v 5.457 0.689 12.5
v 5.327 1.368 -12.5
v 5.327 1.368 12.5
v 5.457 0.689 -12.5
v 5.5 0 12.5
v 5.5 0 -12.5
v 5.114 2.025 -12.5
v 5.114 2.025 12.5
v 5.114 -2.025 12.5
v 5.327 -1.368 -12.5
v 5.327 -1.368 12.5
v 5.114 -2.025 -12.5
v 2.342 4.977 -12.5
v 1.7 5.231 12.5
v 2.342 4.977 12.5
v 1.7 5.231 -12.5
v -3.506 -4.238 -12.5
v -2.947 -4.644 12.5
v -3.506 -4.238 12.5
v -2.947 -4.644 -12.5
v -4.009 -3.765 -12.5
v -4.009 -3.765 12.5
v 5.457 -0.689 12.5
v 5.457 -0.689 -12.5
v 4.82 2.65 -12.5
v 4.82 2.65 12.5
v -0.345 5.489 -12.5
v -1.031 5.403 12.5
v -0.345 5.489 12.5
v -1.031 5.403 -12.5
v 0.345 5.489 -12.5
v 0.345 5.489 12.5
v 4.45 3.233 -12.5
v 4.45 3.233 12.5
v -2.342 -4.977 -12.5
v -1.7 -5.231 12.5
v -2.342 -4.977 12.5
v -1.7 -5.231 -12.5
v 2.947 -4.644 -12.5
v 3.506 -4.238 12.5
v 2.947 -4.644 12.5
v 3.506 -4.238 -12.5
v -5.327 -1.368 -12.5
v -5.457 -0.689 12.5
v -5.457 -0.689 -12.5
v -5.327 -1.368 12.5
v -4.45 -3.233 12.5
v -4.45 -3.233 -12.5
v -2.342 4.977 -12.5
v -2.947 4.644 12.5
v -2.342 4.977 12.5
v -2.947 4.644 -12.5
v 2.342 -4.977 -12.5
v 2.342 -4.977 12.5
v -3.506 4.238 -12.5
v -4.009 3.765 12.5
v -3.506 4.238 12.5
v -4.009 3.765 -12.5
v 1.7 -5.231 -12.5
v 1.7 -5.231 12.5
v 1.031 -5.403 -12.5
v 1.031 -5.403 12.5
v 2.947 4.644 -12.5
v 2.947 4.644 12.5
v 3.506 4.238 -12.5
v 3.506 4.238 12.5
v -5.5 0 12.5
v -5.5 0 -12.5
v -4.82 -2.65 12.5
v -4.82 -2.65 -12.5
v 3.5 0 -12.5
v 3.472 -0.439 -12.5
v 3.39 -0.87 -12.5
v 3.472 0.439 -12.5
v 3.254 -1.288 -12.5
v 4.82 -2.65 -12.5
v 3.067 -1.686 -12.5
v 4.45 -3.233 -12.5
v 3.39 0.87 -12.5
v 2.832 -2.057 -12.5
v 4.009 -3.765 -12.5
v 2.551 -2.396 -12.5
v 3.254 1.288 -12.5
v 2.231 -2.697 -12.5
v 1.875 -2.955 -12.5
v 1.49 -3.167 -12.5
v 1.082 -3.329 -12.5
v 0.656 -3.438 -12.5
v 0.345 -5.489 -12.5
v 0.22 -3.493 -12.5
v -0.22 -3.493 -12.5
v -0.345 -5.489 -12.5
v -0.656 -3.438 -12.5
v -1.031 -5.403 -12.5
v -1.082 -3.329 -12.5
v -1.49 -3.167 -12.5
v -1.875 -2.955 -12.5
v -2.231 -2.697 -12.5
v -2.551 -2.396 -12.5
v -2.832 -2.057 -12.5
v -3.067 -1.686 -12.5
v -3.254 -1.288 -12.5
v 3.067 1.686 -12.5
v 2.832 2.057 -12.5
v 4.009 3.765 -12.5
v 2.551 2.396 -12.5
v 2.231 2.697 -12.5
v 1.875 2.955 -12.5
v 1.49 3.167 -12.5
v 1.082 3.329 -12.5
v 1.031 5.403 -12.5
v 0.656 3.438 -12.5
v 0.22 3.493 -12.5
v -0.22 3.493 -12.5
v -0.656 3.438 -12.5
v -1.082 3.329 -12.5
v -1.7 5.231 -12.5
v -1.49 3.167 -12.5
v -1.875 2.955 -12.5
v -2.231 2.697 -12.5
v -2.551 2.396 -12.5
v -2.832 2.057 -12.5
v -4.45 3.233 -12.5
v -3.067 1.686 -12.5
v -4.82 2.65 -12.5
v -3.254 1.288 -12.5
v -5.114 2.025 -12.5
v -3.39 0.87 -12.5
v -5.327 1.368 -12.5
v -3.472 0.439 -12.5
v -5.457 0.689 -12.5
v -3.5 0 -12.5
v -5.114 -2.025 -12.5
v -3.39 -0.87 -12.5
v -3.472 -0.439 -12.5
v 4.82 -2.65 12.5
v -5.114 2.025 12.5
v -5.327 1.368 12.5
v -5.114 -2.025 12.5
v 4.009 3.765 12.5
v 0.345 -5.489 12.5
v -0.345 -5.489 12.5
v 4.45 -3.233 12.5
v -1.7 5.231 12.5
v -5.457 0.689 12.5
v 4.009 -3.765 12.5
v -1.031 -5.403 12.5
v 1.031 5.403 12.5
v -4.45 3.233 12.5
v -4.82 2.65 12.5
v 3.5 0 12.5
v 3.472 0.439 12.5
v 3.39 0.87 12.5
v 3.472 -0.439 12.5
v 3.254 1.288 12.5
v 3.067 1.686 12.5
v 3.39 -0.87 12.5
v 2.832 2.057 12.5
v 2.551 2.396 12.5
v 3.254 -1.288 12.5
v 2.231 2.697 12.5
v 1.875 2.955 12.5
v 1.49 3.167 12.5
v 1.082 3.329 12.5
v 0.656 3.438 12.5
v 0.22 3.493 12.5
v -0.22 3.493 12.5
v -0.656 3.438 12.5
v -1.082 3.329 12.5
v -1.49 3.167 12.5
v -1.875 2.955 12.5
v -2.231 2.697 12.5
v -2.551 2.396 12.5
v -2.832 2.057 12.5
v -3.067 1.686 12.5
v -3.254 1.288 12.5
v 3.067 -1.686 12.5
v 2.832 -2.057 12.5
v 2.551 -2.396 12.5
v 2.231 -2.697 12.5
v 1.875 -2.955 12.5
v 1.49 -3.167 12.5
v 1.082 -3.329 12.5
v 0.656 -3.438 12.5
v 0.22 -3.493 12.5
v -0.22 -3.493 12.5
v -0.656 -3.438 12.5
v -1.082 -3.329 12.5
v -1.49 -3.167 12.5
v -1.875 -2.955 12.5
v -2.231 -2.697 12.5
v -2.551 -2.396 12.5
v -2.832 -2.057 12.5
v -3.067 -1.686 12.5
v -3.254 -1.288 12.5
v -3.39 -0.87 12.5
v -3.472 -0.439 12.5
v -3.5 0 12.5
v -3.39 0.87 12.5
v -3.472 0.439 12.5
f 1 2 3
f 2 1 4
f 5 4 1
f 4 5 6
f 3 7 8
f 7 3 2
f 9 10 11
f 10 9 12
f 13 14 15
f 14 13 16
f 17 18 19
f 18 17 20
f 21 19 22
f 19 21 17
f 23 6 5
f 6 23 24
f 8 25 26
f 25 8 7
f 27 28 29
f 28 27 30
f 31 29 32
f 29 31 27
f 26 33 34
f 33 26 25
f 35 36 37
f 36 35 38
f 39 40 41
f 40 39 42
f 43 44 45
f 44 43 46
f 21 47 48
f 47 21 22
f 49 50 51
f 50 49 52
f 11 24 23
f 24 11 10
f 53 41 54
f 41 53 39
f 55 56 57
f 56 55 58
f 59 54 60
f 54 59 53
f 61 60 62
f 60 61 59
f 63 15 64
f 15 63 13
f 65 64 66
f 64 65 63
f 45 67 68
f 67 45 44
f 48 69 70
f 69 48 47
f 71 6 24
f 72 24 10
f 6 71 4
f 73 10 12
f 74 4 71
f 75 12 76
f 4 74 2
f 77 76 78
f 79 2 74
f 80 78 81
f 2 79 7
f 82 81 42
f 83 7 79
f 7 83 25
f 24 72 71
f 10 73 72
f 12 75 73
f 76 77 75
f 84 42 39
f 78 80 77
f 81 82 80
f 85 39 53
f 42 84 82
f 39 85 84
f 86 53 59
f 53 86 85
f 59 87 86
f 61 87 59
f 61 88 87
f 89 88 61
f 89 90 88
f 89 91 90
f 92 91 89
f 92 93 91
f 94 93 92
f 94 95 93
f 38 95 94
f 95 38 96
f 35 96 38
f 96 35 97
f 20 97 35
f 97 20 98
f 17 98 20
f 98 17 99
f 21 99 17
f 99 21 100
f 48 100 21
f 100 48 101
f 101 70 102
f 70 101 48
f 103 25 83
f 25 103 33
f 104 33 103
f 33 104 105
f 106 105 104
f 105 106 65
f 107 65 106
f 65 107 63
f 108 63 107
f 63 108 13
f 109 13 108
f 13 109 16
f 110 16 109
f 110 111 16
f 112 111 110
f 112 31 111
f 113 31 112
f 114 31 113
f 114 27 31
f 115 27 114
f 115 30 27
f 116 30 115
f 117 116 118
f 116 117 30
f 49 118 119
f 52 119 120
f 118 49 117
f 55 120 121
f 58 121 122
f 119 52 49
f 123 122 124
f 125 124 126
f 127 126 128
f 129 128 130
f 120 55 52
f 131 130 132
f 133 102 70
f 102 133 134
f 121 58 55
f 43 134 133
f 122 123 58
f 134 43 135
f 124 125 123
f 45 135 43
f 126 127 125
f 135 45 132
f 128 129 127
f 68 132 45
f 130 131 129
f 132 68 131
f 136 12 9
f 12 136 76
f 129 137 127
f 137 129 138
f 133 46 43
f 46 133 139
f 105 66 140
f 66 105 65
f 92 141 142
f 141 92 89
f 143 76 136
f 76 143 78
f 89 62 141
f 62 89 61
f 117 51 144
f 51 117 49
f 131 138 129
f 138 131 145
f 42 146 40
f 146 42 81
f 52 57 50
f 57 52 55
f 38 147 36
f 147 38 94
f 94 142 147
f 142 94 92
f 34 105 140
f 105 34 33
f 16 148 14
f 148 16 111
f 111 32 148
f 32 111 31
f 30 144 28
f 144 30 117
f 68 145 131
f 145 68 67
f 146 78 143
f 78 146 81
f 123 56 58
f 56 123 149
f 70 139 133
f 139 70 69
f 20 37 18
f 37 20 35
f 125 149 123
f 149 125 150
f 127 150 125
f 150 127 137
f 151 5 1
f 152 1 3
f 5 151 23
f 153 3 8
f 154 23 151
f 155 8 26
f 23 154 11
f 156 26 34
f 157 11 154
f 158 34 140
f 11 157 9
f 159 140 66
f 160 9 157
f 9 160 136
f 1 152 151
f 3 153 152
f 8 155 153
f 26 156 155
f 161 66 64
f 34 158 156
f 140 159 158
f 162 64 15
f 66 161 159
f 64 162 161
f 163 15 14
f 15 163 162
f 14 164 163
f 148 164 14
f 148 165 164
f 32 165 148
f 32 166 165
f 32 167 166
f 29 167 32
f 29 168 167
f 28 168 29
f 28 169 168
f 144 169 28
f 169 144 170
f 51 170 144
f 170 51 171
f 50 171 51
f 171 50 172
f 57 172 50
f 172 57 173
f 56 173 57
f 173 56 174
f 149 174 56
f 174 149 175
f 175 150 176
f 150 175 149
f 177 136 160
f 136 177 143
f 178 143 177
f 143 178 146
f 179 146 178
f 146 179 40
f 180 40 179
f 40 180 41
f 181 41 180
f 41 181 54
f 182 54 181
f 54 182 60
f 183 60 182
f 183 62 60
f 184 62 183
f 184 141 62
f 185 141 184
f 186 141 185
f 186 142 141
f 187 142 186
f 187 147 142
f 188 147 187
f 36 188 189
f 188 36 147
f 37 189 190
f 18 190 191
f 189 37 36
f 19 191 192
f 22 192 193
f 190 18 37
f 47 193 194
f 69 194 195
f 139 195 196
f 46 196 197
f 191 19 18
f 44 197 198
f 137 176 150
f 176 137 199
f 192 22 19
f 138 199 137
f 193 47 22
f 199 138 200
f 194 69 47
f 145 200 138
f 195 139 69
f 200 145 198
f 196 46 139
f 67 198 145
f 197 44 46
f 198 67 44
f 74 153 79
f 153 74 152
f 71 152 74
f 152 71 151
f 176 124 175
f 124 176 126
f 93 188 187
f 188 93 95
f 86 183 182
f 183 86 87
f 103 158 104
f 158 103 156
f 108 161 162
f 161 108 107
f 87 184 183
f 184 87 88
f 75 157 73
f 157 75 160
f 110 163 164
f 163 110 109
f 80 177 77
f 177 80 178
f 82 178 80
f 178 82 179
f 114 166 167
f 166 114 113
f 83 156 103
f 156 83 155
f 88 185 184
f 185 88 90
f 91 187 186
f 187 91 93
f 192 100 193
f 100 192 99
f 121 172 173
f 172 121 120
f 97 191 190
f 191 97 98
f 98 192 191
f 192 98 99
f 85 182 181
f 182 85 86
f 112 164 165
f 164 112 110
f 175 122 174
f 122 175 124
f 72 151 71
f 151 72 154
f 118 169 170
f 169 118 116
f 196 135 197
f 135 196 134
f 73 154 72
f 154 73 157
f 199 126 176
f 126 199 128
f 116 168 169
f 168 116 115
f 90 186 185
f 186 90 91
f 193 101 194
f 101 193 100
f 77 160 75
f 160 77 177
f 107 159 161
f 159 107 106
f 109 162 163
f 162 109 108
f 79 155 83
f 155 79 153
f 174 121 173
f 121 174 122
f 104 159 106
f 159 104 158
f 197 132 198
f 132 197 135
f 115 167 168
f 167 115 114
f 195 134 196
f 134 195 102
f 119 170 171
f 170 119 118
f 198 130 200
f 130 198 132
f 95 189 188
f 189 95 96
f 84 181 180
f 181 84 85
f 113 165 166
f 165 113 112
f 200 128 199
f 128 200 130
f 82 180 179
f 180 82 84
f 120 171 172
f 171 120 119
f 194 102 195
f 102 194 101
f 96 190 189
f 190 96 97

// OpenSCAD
$fn = 50;


difference() {
	union() {
		translate(v = [0, 0, -12.5000000000]) {
			cylinder(h = 25, r = 5.5000000000);
		}
	}
	union() {
		translate(v = [0, 0, -100.0000000000]) {
			cylinder(h = 200, r = 3.5000000000);
		}
	}
}
